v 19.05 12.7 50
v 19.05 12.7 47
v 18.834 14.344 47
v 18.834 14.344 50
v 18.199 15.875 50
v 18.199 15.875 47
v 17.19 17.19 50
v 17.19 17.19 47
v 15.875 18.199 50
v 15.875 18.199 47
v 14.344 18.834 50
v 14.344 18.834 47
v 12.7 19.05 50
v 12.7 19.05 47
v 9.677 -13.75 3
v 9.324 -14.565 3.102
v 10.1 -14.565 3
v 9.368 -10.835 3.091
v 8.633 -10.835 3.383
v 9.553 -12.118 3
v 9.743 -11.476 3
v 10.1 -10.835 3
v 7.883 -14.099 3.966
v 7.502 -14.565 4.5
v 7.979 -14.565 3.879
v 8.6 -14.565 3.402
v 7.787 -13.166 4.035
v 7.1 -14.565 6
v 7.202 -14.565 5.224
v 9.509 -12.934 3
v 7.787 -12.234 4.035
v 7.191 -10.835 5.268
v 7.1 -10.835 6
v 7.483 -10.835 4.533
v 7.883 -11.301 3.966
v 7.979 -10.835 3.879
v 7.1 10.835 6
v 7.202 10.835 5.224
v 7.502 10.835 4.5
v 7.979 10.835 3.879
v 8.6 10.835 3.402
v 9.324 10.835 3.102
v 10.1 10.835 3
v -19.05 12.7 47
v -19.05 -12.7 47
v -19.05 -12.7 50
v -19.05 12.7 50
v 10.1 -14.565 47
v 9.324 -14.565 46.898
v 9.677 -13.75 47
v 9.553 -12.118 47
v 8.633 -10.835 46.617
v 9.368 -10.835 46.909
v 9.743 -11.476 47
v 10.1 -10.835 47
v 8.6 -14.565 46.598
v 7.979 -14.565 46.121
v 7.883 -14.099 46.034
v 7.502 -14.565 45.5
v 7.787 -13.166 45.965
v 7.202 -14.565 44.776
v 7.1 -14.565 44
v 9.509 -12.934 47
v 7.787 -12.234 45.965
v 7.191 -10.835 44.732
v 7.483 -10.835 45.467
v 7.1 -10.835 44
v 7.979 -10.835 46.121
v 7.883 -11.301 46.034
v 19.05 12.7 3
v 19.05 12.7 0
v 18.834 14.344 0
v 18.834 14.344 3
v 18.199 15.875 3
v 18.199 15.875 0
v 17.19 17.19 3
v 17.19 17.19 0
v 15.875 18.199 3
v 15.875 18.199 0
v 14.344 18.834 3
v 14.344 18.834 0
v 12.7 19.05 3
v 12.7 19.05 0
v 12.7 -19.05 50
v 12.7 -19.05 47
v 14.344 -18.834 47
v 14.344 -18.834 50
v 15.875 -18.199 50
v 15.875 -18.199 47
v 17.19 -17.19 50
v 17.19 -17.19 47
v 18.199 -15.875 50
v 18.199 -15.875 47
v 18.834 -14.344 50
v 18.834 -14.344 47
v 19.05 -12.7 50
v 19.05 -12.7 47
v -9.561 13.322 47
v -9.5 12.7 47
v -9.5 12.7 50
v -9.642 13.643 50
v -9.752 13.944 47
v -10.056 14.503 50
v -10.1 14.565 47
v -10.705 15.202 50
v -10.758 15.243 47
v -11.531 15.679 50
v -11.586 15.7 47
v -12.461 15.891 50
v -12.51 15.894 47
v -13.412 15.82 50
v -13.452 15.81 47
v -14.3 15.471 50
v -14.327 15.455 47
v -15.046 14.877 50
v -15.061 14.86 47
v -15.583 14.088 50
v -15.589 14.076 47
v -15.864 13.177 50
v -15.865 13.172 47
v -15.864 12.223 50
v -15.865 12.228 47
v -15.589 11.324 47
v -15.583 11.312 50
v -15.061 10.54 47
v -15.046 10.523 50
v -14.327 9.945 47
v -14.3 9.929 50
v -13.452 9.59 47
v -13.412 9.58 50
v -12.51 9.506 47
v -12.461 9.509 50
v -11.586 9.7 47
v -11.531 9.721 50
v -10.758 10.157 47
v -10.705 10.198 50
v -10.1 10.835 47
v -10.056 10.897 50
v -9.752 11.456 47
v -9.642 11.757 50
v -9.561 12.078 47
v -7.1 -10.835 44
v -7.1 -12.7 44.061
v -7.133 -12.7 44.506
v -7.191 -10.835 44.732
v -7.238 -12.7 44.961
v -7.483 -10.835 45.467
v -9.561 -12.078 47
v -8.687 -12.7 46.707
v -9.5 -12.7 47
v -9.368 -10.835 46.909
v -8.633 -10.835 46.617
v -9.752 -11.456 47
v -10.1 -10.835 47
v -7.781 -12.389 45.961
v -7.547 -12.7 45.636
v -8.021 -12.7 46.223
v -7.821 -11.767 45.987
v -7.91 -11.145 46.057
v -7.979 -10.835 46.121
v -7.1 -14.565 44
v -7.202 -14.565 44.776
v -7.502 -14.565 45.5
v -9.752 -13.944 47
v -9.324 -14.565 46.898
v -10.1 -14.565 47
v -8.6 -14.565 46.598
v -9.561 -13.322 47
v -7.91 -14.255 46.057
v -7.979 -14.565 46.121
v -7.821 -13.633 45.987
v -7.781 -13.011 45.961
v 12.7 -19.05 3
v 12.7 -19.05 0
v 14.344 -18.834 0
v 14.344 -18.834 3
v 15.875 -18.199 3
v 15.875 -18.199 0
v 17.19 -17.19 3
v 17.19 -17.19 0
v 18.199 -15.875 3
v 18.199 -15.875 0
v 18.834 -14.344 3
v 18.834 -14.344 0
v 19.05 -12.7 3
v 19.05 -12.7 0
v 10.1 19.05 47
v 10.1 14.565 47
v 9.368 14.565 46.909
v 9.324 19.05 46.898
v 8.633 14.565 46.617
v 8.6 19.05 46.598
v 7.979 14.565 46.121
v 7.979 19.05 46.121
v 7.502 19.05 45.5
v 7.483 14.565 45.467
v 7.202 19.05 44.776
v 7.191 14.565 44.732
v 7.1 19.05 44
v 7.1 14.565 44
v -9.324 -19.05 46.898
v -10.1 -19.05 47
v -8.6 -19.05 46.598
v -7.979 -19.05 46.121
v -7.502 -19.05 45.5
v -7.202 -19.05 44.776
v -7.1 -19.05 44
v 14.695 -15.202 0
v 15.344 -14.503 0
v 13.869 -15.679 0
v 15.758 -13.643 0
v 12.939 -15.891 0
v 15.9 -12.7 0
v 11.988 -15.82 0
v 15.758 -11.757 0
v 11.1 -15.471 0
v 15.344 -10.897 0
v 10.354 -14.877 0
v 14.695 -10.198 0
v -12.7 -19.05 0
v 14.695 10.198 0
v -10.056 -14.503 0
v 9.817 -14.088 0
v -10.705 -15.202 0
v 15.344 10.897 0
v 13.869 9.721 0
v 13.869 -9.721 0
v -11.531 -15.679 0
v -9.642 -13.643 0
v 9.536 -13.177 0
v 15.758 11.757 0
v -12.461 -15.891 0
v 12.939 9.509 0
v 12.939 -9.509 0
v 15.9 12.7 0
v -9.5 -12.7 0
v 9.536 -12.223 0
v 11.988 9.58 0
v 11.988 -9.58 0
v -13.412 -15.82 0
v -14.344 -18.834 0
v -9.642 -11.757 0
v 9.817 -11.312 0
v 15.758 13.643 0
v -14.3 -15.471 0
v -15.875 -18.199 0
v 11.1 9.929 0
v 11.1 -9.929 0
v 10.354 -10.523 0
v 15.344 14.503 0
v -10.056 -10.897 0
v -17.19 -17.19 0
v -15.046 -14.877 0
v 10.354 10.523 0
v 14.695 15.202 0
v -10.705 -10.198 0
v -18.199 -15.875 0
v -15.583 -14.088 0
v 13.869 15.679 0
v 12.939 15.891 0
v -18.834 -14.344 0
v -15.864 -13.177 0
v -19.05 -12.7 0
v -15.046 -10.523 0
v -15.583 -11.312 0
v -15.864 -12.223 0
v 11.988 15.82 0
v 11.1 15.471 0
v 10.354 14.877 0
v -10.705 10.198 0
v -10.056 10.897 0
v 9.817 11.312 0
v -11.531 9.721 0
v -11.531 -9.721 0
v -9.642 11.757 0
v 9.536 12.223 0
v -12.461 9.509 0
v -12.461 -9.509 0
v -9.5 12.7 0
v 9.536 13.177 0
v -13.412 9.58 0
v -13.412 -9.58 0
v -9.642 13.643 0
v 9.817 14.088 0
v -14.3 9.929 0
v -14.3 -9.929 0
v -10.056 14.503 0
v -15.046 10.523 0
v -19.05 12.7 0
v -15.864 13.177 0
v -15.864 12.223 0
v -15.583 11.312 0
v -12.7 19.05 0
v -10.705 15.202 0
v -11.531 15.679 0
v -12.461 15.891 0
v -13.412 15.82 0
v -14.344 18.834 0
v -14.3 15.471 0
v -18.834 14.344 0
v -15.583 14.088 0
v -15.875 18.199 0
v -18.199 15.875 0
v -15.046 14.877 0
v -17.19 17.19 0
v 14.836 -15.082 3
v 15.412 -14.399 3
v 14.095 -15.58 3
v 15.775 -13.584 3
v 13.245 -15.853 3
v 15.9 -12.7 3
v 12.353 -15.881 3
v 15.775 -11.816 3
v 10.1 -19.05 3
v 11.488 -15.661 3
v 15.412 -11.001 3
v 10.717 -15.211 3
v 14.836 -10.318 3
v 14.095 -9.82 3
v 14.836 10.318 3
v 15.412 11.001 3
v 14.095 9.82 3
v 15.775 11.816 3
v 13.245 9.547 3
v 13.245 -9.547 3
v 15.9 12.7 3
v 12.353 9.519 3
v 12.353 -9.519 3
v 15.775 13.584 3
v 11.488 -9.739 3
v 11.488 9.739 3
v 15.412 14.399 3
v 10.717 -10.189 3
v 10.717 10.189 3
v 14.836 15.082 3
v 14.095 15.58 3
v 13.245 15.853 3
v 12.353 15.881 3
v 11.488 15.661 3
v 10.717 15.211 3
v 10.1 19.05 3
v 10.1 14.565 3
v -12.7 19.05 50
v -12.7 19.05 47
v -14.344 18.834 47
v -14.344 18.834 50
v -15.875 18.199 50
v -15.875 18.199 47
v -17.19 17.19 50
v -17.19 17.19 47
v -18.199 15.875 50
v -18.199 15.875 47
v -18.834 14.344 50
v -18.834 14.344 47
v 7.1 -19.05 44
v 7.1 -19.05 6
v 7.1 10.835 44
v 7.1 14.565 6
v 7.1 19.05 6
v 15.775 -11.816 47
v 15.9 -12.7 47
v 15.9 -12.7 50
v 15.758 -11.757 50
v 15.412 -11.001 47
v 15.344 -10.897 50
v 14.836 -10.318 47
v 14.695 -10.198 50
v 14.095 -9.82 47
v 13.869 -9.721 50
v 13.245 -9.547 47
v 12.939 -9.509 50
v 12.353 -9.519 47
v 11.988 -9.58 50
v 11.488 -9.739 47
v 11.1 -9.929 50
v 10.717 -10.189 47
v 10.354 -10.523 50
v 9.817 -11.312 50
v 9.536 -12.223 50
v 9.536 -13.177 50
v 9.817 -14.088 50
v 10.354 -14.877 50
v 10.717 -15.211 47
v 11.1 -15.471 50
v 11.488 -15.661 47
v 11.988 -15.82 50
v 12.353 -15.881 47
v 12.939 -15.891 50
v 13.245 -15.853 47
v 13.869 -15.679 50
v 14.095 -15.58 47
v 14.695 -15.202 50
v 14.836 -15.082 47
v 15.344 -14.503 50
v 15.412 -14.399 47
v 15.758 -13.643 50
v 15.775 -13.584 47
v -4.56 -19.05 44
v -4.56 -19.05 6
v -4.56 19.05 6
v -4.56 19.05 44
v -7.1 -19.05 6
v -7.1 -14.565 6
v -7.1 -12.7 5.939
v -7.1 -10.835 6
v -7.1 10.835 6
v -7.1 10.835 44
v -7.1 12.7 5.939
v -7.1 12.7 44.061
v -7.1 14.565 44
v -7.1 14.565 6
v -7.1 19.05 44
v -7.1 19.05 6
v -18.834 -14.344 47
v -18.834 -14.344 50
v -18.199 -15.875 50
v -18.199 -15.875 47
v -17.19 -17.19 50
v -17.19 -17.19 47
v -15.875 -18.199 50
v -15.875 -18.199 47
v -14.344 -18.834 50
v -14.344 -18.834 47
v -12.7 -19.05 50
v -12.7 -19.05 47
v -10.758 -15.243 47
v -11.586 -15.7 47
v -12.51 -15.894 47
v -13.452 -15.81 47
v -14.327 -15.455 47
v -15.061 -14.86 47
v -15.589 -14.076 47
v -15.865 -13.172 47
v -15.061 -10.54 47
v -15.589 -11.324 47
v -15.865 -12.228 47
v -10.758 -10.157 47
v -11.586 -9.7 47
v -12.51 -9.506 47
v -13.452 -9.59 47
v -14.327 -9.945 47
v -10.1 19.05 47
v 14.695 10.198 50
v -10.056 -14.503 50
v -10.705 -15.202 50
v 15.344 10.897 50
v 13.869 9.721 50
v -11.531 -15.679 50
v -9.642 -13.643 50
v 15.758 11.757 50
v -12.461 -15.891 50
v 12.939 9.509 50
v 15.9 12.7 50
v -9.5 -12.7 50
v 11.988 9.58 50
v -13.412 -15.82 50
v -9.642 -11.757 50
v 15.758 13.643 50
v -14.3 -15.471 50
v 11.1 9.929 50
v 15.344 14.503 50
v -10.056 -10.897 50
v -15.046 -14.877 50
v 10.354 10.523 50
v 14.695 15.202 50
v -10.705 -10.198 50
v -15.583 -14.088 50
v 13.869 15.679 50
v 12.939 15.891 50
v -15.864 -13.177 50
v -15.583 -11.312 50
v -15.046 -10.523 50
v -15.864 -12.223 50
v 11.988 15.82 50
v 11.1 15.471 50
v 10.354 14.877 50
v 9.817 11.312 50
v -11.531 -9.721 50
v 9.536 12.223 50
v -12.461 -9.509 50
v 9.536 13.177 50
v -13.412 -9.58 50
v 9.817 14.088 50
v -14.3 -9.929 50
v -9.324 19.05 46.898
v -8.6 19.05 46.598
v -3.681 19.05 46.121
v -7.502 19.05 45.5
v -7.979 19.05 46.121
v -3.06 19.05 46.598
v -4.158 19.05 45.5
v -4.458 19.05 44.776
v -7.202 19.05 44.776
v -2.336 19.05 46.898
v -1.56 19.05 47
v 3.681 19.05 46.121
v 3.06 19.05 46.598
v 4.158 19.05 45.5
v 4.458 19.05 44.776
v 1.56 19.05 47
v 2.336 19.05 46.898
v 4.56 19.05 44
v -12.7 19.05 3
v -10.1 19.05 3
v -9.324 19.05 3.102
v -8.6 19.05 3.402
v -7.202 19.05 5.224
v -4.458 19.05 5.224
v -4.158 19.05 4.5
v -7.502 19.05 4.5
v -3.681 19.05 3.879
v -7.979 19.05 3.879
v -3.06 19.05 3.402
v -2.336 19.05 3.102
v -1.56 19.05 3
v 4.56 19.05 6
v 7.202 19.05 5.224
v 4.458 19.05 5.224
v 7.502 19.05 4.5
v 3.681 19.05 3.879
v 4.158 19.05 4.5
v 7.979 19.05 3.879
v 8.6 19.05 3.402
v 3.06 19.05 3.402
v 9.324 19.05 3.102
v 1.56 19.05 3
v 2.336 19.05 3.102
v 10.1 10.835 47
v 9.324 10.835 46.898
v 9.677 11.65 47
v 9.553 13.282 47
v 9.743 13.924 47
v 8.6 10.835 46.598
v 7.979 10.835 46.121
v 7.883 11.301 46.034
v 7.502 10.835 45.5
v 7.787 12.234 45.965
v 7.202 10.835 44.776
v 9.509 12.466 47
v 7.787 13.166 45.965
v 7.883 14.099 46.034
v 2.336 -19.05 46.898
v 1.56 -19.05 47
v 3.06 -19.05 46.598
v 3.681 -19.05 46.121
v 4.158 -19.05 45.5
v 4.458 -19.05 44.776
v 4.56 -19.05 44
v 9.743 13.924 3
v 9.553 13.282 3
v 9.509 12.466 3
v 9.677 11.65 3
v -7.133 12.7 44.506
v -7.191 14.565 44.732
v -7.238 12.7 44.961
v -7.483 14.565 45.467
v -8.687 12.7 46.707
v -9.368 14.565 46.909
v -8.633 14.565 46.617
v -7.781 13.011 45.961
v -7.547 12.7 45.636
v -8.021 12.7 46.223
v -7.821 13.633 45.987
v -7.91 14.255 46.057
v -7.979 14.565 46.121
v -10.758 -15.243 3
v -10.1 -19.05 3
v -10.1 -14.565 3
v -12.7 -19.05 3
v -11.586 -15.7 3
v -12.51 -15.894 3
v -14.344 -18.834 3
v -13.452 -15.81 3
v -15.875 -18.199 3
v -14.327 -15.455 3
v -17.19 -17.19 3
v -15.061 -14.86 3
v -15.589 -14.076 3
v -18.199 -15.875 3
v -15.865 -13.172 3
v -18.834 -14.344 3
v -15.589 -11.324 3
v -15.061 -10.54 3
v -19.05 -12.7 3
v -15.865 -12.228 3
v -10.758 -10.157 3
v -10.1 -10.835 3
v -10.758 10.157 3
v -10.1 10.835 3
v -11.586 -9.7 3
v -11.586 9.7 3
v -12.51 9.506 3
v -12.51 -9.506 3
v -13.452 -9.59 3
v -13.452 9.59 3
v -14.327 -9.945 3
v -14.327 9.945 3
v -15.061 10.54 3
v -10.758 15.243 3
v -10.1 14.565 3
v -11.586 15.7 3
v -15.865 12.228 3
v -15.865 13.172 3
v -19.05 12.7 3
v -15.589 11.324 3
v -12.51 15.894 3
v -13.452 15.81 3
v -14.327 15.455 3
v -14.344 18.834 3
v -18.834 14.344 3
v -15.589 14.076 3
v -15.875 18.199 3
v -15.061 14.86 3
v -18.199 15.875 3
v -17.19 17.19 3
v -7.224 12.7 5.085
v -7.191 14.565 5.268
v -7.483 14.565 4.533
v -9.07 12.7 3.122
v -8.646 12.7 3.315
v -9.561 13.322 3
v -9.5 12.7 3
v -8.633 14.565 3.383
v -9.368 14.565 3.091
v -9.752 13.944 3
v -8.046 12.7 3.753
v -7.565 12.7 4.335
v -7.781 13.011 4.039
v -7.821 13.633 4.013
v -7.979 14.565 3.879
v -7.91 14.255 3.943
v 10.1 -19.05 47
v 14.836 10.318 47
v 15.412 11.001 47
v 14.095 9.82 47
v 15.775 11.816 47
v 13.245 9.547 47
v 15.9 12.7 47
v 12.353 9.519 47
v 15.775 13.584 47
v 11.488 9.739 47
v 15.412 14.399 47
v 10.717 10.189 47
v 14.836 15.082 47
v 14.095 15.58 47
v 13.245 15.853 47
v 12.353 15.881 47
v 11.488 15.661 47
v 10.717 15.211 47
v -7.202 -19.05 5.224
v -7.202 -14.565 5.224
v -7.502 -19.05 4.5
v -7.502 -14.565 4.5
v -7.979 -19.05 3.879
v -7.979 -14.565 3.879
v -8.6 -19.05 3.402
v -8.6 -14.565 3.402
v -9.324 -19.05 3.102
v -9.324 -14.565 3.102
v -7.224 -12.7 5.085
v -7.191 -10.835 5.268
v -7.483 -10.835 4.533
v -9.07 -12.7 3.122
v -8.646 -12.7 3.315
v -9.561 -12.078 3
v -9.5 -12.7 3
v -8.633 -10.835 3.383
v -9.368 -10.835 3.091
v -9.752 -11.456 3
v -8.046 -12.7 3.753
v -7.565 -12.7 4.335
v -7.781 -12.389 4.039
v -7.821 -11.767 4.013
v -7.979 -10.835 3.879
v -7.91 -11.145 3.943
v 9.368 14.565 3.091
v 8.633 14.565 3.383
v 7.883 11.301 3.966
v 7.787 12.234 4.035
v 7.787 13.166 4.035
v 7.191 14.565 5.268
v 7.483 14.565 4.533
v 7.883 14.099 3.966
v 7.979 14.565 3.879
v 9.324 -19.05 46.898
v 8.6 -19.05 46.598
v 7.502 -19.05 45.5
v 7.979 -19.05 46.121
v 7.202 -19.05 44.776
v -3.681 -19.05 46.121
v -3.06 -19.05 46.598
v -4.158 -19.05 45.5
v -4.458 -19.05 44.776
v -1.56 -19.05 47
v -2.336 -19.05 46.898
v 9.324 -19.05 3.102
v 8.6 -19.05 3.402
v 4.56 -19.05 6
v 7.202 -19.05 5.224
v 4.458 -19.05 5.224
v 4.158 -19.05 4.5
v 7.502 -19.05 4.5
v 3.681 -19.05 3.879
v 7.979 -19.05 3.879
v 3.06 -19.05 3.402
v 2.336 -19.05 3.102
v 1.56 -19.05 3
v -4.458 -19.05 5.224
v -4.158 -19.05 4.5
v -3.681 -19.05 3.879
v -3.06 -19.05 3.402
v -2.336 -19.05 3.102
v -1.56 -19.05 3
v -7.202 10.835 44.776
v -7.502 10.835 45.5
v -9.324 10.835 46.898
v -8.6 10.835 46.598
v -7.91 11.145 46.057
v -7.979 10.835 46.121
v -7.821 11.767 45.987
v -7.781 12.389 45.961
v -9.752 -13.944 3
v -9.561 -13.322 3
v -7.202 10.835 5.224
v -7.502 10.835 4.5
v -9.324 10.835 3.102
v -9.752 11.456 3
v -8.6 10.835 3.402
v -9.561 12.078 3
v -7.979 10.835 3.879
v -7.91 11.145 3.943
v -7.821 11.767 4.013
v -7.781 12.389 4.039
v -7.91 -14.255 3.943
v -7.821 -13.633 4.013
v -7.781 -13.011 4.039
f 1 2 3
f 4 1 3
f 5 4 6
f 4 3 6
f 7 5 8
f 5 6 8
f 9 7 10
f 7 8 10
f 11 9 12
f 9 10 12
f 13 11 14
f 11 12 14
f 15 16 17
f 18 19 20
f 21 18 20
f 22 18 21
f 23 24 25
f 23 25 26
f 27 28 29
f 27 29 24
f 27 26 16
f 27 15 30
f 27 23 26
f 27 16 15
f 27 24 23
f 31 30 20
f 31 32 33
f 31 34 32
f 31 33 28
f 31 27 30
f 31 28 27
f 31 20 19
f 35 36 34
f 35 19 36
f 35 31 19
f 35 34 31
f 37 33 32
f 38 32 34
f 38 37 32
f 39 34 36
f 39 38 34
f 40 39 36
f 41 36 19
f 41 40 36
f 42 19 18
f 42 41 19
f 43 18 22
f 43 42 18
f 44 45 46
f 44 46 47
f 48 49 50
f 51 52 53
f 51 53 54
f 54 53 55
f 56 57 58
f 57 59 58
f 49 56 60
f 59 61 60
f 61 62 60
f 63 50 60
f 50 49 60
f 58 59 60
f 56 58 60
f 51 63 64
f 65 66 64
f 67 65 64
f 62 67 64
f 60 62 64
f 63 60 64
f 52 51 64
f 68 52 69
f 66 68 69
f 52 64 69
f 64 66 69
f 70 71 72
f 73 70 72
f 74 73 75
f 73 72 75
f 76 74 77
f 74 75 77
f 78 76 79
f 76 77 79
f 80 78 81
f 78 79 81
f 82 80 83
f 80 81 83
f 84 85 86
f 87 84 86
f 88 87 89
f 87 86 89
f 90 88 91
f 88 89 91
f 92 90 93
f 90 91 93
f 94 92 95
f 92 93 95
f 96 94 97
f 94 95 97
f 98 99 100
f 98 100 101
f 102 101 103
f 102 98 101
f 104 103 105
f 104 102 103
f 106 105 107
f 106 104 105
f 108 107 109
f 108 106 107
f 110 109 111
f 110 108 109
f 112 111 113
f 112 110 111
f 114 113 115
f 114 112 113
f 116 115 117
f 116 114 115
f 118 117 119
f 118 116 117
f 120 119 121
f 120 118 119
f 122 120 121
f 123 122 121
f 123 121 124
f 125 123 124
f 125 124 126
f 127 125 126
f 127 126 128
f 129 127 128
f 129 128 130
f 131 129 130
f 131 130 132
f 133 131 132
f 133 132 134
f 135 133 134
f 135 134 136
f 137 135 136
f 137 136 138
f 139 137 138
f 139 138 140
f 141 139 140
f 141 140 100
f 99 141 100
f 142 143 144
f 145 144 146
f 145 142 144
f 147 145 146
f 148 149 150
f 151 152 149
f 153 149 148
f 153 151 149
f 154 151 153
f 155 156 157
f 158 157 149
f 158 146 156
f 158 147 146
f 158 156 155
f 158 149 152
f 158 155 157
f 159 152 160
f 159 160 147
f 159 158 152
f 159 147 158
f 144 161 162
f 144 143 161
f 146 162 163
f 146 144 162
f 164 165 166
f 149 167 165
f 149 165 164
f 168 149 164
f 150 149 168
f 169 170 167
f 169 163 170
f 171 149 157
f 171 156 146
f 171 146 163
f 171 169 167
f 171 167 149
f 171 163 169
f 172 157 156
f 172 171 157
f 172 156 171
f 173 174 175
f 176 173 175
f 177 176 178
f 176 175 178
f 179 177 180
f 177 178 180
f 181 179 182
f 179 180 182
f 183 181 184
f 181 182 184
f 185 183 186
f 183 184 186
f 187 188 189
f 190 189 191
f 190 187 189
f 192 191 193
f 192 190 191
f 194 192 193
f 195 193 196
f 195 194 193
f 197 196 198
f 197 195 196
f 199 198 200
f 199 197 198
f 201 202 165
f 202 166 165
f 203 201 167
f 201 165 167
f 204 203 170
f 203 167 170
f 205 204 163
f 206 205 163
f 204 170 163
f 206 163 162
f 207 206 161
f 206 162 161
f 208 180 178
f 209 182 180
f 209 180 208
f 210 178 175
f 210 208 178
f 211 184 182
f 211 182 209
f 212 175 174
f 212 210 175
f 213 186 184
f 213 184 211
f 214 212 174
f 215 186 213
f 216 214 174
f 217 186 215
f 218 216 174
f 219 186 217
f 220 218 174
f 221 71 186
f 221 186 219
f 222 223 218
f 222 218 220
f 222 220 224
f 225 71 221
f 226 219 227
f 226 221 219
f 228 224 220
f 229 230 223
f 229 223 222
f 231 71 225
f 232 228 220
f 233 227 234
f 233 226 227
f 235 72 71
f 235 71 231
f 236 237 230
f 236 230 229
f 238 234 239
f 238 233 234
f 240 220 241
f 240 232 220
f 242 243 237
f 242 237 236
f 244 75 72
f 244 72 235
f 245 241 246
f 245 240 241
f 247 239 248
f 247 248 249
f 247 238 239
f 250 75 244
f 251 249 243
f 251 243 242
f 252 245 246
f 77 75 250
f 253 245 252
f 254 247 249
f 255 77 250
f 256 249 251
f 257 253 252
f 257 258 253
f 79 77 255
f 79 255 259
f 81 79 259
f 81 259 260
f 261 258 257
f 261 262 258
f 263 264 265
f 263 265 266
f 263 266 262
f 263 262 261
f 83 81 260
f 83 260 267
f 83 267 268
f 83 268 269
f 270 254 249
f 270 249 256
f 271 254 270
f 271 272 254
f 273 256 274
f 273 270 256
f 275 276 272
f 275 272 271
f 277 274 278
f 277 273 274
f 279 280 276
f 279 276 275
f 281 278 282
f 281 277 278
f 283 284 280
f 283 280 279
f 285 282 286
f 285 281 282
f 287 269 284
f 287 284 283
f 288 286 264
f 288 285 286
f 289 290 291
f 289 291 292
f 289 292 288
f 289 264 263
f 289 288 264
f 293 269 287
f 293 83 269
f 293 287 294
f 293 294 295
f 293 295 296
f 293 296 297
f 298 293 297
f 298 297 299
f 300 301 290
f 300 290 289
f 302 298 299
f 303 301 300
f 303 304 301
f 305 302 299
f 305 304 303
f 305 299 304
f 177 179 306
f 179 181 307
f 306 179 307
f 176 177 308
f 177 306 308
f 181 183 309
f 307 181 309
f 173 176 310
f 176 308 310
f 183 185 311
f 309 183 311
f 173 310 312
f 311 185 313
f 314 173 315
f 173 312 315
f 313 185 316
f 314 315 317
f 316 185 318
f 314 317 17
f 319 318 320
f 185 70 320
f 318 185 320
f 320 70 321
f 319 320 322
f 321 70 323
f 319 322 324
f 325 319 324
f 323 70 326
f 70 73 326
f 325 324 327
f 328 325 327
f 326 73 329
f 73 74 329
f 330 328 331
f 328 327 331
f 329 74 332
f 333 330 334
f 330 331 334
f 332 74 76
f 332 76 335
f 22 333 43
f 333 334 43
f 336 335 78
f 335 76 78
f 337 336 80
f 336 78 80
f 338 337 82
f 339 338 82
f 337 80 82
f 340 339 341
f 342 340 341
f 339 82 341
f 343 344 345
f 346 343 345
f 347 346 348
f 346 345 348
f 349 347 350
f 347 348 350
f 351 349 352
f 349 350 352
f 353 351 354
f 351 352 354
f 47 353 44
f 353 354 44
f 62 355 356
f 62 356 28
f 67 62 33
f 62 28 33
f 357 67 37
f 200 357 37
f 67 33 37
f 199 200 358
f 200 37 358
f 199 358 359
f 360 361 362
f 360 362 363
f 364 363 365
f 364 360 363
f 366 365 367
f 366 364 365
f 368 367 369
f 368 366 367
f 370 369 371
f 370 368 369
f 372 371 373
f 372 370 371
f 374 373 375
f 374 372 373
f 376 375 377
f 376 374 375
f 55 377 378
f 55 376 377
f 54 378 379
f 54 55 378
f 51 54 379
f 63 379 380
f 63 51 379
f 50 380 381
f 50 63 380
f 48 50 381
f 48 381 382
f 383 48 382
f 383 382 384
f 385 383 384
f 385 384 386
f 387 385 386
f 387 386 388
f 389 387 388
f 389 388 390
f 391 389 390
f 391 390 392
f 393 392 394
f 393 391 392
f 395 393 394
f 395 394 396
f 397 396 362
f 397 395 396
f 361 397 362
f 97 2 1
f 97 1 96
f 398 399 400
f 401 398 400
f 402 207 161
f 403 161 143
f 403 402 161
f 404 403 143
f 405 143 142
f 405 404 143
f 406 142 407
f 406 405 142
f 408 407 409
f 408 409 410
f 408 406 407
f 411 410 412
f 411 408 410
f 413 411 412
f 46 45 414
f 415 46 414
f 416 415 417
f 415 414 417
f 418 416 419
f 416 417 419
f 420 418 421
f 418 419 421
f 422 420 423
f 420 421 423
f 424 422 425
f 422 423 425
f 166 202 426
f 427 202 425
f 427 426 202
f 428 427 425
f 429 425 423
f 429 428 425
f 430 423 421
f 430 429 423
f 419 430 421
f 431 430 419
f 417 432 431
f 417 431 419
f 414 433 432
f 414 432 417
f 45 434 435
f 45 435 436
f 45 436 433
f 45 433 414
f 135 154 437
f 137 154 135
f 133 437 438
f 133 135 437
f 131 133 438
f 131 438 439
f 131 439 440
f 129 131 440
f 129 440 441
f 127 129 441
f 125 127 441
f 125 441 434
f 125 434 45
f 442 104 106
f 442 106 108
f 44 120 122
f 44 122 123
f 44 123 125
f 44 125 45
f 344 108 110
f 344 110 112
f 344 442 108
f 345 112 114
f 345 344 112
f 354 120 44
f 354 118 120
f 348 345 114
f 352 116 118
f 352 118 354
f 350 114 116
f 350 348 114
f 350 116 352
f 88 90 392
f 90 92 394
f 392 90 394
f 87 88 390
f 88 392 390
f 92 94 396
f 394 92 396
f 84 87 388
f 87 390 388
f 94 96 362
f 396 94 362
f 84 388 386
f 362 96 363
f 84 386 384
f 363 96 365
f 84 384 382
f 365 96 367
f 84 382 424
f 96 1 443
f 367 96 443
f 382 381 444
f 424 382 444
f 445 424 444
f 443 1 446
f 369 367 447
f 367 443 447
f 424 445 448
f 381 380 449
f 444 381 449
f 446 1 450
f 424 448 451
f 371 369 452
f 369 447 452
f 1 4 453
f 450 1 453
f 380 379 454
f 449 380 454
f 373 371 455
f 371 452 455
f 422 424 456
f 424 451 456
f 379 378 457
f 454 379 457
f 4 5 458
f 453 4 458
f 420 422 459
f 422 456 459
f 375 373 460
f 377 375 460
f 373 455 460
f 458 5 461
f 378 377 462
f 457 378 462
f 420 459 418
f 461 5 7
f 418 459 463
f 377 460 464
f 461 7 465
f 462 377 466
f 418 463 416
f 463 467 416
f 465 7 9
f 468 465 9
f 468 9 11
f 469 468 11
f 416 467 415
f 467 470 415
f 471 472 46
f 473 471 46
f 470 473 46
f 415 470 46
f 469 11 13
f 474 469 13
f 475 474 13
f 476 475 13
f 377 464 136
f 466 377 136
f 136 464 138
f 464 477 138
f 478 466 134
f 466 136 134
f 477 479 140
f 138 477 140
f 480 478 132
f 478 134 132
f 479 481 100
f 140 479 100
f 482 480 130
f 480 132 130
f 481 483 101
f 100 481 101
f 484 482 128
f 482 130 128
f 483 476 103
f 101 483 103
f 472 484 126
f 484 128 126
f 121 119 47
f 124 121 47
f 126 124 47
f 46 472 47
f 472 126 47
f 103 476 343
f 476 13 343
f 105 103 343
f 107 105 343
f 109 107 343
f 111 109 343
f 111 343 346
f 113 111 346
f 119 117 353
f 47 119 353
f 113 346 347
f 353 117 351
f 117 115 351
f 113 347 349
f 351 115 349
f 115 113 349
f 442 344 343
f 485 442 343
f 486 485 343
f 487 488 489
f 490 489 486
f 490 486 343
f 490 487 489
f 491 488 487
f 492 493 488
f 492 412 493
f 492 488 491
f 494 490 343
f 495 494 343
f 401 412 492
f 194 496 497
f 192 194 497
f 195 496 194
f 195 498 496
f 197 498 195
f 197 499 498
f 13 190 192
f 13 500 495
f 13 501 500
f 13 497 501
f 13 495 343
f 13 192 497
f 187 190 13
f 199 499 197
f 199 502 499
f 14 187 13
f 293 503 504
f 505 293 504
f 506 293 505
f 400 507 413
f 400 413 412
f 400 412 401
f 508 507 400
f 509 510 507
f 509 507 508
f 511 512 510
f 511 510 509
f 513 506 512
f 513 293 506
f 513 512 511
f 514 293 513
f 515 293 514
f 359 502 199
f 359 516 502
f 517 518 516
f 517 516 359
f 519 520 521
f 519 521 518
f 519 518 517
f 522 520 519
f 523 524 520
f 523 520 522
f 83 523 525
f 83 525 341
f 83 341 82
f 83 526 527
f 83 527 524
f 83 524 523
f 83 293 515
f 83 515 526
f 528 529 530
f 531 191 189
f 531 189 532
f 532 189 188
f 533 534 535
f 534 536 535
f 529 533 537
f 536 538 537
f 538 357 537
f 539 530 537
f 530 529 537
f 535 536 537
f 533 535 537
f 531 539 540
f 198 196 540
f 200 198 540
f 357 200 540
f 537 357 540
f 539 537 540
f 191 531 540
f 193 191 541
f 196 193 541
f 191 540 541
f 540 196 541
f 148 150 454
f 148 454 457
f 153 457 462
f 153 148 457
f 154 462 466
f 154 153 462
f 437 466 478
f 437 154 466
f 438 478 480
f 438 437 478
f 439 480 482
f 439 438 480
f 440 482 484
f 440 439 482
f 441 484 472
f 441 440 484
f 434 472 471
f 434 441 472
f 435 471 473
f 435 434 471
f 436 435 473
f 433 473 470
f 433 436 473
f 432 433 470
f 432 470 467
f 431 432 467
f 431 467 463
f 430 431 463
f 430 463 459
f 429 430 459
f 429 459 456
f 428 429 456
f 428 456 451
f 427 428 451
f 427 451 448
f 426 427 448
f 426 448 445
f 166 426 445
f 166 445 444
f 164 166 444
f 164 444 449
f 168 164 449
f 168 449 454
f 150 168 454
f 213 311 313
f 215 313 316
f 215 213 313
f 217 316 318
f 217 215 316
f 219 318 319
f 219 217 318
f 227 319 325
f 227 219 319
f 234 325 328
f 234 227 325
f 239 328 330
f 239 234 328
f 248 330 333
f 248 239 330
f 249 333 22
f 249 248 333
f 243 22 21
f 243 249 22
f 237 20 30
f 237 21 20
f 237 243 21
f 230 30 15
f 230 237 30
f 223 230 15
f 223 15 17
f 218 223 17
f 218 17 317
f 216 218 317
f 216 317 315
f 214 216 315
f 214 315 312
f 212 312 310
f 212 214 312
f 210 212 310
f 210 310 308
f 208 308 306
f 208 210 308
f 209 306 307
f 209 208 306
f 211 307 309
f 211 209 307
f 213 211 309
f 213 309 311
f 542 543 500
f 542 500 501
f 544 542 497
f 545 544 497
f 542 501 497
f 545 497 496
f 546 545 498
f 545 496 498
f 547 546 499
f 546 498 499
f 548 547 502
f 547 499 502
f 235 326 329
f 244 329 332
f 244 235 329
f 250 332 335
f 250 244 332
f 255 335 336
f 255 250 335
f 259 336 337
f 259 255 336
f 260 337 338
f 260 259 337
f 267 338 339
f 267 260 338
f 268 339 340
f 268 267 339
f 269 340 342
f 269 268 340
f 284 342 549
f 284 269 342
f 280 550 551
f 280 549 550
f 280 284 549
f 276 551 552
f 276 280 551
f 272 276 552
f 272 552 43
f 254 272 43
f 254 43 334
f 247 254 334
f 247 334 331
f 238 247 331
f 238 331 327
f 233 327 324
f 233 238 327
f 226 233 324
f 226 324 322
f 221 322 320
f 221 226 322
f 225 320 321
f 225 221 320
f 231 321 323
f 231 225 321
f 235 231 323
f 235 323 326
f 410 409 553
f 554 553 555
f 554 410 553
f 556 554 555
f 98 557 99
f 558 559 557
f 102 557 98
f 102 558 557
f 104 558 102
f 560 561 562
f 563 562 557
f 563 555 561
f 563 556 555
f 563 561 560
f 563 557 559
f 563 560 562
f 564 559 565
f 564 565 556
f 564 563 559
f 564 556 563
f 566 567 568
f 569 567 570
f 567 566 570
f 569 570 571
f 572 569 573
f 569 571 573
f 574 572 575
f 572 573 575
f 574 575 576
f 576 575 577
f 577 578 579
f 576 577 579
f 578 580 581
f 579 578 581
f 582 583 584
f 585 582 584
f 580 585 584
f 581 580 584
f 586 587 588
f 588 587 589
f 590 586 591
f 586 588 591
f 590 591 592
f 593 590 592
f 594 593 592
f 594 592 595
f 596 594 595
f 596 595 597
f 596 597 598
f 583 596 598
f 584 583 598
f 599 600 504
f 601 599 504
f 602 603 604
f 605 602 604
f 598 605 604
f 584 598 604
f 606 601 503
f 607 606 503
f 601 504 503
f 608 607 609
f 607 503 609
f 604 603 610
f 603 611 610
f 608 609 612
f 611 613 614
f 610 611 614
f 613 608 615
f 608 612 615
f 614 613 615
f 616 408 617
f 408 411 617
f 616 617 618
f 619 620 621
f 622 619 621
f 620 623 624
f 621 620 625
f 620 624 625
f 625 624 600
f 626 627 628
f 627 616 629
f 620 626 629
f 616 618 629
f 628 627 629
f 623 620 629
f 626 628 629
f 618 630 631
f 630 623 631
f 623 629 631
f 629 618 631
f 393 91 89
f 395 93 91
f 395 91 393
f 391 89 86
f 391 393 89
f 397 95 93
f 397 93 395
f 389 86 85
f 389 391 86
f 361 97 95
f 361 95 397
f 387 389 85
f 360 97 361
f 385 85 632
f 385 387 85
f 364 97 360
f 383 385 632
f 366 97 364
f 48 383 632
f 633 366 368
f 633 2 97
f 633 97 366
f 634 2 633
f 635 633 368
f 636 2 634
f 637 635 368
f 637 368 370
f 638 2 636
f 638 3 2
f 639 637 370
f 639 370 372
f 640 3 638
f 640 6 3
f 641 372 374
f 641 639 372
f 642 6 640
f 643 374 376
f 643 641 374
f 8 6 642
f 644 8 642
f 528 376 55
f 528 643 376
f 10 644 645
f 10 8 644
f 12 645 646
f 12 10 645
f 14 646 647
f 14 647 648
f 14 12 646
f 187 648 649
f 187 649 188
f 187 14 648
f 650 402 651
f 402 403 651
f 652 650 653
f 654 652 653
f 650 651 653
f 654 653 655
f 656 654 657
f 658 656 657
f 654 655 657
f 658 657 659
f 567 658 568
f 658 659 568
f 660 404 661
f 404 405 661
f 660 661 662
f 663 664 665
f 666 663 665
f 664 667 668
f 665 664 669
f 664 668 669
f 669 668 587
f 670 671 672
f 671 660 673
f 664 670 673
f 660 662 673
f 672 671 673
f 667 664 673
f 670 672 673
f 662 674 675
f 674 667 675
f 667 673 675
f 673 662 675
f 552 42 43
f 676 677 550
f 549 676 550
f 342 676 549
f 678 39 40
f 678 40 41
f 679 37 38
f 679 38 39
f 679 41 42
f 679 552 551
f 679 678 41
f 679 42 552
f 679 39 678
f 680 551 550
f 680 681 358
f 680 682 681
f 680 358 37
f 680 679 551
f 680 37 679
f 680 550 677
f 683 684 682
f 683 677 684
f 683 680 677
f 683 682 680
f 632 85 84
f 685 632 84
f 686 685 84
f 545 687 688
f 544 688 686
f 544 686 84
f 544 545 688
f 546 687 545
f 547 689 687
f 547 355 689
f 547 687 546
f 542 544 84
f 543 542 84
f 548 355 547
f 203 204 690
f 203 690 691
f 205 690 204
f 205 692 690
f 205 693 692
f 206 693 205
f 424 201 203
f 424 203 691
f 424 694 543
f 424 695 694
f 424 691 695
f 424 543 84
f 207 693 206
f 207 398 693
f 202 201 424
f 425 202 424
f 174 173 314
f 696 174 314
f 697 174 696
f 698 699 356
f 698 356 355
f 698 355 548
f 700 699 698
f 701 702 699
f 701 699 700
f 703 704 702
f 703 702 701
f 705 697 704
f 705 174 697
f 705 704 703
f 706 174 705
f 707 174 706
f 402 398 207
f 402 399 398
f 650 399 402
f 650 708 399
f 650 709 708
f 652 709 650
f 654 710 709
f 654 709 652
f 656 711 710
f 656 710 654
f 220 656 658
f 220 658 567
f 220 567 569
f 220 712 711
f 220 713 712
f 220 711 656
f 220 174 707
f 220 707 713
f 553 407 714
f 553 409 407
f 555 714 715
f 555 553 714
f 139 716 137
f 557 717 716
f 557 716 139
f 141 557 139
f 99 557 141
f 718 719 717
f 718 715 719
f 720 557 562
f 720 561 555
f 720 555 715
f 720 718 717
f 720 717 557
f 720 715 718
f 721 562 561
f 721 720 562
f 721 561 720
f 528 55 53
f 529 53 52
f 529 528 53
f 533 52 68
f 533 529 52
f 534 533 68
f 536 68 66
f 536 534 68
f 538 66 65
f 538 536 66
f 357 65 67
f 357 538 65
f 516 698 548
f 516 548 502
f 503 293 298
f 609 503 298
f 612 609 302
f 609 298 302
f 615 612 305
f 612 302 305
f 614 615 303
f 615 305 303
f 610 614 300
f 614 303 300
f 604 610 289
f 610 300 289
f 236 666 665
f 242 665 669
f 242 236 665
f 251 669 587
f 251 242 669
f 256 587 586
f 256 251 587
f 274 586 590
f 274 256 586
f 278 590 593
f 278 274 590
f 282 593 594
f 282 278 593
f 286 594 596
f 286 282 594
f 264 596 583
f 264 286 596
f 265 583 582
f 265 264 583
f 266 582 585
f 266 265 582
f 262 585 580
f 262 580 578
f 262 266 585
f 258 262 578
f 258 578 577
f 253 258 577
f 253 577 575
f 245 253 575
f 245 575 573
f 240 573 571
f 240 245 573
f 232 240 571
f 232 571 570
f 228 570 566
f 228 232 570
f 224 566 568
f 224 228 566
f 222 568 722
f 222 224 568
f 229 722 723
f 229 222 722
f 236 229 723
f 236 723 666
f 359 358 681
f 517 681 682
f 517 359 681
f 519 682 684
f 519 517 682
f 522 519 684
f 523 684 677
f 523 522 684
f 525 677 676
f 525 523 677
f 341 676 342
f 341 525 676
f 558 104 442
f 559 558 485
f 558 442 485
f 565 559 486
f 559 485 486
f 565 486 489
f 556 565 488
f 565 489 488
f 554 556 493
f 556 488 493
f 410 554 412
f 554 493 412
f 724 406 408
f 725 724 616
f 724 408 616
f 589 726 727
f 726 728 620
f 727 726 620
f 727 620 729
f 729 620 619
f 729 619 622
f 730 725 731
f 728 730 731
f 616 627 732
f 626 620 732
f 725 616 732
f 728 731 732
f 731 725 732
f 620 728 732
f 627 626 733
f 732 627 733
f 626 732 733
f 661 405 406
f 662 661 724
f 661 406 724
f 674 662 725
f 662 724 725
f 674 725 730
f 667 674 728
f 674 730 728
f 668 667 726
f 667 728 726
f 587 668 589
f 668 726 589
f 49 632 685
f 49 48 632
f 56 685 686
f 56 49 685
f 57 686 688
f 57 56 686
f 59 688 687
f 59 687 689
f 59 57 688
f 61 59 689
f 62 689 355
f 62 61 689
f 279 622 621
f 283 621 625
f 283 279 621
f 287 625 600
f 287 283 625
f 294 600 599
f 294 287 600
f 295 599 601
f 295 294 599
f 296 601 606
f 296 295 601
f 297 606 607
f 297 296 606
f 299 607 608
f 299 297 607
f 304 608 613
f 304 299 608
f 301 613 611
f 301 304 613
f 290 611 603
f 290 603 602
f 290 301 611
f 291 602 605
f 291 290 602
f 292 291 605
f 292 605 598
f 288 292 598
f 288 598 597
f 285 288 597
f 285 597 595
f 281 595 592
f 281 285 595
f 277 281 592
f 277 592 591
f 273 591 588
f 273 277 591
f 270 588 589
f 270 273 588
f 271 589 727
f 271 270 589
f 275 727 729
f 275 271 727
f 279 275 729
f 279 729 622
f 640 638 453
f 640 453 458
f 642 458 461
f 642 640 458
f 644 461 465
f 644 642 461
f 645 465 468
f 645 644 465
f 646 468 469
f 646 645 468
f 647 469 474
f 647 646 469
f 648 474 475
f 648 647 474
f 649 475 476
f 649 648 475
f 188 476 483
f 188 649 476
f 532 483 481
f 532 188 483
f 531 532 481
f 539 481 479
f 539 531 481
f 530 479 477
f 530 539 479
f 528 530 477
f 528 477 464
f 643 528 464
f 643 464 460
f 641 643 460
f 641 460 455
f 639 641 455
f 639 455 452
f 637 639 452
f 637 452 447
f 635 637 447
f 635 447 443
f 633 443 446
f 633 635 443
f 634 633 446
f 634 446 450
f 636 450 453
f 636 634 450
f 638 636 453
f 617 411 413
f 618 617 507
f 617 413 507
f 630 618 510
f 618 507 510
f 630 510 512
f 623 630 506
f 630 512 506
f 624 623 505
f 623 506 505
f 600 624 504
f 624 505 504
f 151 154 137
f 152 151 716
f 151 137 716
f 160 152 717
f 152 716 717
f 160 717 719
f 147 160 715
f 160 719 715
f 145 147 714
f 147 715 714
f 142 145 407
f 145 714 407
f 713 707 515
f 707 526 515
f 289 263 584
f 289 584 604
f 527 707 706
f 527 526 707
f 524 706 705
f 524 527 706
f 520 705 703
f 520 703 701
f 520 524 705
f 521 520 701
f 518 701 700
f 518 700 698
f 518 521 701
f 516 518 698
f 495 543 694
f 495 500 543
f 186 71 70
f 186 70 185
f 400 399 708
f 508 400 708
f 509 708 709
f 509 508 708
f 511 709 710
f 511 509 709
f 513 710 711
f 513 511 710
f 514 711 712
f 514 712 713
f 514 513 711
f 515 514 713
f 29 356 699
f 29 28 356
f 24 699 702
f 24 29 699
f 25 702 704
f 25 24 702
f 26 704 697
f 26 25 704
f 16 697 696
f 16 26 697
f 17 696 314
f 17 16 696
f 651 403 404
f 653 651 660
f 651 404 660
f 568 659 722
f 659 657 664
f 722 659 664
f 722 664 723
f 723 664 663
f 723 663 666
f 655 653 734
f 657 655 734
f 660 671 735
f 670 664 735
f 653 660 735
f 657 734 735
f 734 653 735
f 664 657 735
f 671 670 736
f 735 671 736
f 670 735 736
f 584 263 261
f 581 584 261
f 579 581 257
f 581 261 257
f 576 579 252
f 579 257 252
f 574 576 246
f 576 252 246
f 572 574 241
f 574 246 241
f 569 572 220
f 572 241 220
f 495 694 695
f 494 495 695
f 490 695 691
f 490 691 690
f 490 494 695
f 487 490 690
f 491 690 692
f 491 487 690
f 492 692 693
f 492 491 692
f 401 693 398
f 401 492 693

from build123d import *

# Parameters (mm, degrees)
SKETCH_R     = 3.2
PAD_DEPTH    = 3
SKETCH001_W  = 2.54
SKETCH001_H  = 38.1
PAD001_DEPTH = 44
SKETCH002_R  = 3.2
PAD002_DEPTH = 3
FILLET_R     = 3


with BuildPart() as part:
    # Sketch → Pad (new body)
    with BuildSketch(Plane.XY):
        with BuildLine():
            Line((-12.7, 19.05), (12.7, 19.05))
            ThreePointArc((19.05, 12.7), (17.190128, 17.190128), (12.7, 19.05))
            Line((19.05, 12.7), (19.05, -12.7))
            ThreePointArc((12.7, -19.05), (17.190128, -17.190128), (19.05, -12.7))
            Line((12.7, -19.05), (-12.7, -19.05))
            ThreePointArc((-19.05, -12.7), (-17.190128, -17.190128), (-12.7, -19.05))
            Line((-19.05, -12.7), (-19.05, 12.7))
            ThreePointArc((-12.7, 19.05), (-17.190128, 17.190128), (-19.05, 12.7))
        make_face()
        with Locations((-12.7, 12.7)):
            Circle(SKETCH_R, mode=Mode.SUBTRACT)
        with Locations((12.7, 12.7)):
            Circle(SKETCH_R, mode=Mode.SUBTRACT)
        with Locations((12.7, -12.7)):
            Circle(SKETCH_R, mode=Mode.SUBTRACT)
        with Locations((-12.7, -12.7)):
            Circle(SKETCH_R, mode=Mode.SUBTRACT)
    extrude(amount=PAD_DEPTH)

    # Sketch001 (on Face14 of Pad) → Pad001 (join)
    with BuildSketch(Plane.XY.offset(3)):
        with Locations((-5.83, 0)):
            Rectangle(SKETCH001_W, SKETCH001_H)
        with Locations((5.83, 0)):
            Rectangle(SKETCH001_W, SKETCH001_H)
    extrude(amount=PAD001_DEPTH)

    # Sketch002 (on Face22 of Pad001) → Pad002 (join)
    with BuildSketch(Plane.XY.offset(47)):
        with BuildLine():
            Line((-12.7, 19.05), (12.7, 19.05))
            ThreePointArc((19.05, 12.7), (17.190128, 17.190128), (12.7, 19.05))
            Line((19.05, 12.7), (19.05, -12.7))
            ThreePointArc((12.7, -19.05), (17.190128, -17.190128), (19.05, -12.7))
            Line((12.7, -19.05), (-12.7, -19.05))
            ThreePointArc((-19.05, -12.7), (-17.190128, -17.190128), (-12.7, -19.05))
            Line((-19.05, -12.7), (-19.05, 12.7))
            ThreePointArc((-12.7, 19.05), (-17.190128, 17.190128), (-19.05, 12.7))
        make_face()
        with Locations((-12.7, 12.7)):
            Circle(SKETCH002_R, mode=Mode.SUBTRACT)
        with Locations((12.7, 12.7)):
            Circle(SKETCH002_R, mode=Mode.SUBTRACT)
        with Locations((12.7, -12.7)):
            Circle(SKETCH002_R, mode=Mode.SUBTRACT)
        with Locations((-12.7, -12.7)):
            Circle(SKETCH002_R, mode=Mode.SUBTRACT)
    extrude(amount=PAD002_DEPTH)

    # Fillet
    fillet_edges = [part.edges().sort_by_distance(p)[0] for p in [
        (4.56, 0, 3),
        (-7.1, 0, 3),
        (-4.56, 0, 3),
        (7.1, 0, 3),
        (7.1, 0, 47),
        (-4.56, 0, 47),
        (4.56, 0, 47),
        (-7.1, 0, 47),
    ]]
    fillet(fillet_edges, radius=FILLET_R)


solid = part.part
